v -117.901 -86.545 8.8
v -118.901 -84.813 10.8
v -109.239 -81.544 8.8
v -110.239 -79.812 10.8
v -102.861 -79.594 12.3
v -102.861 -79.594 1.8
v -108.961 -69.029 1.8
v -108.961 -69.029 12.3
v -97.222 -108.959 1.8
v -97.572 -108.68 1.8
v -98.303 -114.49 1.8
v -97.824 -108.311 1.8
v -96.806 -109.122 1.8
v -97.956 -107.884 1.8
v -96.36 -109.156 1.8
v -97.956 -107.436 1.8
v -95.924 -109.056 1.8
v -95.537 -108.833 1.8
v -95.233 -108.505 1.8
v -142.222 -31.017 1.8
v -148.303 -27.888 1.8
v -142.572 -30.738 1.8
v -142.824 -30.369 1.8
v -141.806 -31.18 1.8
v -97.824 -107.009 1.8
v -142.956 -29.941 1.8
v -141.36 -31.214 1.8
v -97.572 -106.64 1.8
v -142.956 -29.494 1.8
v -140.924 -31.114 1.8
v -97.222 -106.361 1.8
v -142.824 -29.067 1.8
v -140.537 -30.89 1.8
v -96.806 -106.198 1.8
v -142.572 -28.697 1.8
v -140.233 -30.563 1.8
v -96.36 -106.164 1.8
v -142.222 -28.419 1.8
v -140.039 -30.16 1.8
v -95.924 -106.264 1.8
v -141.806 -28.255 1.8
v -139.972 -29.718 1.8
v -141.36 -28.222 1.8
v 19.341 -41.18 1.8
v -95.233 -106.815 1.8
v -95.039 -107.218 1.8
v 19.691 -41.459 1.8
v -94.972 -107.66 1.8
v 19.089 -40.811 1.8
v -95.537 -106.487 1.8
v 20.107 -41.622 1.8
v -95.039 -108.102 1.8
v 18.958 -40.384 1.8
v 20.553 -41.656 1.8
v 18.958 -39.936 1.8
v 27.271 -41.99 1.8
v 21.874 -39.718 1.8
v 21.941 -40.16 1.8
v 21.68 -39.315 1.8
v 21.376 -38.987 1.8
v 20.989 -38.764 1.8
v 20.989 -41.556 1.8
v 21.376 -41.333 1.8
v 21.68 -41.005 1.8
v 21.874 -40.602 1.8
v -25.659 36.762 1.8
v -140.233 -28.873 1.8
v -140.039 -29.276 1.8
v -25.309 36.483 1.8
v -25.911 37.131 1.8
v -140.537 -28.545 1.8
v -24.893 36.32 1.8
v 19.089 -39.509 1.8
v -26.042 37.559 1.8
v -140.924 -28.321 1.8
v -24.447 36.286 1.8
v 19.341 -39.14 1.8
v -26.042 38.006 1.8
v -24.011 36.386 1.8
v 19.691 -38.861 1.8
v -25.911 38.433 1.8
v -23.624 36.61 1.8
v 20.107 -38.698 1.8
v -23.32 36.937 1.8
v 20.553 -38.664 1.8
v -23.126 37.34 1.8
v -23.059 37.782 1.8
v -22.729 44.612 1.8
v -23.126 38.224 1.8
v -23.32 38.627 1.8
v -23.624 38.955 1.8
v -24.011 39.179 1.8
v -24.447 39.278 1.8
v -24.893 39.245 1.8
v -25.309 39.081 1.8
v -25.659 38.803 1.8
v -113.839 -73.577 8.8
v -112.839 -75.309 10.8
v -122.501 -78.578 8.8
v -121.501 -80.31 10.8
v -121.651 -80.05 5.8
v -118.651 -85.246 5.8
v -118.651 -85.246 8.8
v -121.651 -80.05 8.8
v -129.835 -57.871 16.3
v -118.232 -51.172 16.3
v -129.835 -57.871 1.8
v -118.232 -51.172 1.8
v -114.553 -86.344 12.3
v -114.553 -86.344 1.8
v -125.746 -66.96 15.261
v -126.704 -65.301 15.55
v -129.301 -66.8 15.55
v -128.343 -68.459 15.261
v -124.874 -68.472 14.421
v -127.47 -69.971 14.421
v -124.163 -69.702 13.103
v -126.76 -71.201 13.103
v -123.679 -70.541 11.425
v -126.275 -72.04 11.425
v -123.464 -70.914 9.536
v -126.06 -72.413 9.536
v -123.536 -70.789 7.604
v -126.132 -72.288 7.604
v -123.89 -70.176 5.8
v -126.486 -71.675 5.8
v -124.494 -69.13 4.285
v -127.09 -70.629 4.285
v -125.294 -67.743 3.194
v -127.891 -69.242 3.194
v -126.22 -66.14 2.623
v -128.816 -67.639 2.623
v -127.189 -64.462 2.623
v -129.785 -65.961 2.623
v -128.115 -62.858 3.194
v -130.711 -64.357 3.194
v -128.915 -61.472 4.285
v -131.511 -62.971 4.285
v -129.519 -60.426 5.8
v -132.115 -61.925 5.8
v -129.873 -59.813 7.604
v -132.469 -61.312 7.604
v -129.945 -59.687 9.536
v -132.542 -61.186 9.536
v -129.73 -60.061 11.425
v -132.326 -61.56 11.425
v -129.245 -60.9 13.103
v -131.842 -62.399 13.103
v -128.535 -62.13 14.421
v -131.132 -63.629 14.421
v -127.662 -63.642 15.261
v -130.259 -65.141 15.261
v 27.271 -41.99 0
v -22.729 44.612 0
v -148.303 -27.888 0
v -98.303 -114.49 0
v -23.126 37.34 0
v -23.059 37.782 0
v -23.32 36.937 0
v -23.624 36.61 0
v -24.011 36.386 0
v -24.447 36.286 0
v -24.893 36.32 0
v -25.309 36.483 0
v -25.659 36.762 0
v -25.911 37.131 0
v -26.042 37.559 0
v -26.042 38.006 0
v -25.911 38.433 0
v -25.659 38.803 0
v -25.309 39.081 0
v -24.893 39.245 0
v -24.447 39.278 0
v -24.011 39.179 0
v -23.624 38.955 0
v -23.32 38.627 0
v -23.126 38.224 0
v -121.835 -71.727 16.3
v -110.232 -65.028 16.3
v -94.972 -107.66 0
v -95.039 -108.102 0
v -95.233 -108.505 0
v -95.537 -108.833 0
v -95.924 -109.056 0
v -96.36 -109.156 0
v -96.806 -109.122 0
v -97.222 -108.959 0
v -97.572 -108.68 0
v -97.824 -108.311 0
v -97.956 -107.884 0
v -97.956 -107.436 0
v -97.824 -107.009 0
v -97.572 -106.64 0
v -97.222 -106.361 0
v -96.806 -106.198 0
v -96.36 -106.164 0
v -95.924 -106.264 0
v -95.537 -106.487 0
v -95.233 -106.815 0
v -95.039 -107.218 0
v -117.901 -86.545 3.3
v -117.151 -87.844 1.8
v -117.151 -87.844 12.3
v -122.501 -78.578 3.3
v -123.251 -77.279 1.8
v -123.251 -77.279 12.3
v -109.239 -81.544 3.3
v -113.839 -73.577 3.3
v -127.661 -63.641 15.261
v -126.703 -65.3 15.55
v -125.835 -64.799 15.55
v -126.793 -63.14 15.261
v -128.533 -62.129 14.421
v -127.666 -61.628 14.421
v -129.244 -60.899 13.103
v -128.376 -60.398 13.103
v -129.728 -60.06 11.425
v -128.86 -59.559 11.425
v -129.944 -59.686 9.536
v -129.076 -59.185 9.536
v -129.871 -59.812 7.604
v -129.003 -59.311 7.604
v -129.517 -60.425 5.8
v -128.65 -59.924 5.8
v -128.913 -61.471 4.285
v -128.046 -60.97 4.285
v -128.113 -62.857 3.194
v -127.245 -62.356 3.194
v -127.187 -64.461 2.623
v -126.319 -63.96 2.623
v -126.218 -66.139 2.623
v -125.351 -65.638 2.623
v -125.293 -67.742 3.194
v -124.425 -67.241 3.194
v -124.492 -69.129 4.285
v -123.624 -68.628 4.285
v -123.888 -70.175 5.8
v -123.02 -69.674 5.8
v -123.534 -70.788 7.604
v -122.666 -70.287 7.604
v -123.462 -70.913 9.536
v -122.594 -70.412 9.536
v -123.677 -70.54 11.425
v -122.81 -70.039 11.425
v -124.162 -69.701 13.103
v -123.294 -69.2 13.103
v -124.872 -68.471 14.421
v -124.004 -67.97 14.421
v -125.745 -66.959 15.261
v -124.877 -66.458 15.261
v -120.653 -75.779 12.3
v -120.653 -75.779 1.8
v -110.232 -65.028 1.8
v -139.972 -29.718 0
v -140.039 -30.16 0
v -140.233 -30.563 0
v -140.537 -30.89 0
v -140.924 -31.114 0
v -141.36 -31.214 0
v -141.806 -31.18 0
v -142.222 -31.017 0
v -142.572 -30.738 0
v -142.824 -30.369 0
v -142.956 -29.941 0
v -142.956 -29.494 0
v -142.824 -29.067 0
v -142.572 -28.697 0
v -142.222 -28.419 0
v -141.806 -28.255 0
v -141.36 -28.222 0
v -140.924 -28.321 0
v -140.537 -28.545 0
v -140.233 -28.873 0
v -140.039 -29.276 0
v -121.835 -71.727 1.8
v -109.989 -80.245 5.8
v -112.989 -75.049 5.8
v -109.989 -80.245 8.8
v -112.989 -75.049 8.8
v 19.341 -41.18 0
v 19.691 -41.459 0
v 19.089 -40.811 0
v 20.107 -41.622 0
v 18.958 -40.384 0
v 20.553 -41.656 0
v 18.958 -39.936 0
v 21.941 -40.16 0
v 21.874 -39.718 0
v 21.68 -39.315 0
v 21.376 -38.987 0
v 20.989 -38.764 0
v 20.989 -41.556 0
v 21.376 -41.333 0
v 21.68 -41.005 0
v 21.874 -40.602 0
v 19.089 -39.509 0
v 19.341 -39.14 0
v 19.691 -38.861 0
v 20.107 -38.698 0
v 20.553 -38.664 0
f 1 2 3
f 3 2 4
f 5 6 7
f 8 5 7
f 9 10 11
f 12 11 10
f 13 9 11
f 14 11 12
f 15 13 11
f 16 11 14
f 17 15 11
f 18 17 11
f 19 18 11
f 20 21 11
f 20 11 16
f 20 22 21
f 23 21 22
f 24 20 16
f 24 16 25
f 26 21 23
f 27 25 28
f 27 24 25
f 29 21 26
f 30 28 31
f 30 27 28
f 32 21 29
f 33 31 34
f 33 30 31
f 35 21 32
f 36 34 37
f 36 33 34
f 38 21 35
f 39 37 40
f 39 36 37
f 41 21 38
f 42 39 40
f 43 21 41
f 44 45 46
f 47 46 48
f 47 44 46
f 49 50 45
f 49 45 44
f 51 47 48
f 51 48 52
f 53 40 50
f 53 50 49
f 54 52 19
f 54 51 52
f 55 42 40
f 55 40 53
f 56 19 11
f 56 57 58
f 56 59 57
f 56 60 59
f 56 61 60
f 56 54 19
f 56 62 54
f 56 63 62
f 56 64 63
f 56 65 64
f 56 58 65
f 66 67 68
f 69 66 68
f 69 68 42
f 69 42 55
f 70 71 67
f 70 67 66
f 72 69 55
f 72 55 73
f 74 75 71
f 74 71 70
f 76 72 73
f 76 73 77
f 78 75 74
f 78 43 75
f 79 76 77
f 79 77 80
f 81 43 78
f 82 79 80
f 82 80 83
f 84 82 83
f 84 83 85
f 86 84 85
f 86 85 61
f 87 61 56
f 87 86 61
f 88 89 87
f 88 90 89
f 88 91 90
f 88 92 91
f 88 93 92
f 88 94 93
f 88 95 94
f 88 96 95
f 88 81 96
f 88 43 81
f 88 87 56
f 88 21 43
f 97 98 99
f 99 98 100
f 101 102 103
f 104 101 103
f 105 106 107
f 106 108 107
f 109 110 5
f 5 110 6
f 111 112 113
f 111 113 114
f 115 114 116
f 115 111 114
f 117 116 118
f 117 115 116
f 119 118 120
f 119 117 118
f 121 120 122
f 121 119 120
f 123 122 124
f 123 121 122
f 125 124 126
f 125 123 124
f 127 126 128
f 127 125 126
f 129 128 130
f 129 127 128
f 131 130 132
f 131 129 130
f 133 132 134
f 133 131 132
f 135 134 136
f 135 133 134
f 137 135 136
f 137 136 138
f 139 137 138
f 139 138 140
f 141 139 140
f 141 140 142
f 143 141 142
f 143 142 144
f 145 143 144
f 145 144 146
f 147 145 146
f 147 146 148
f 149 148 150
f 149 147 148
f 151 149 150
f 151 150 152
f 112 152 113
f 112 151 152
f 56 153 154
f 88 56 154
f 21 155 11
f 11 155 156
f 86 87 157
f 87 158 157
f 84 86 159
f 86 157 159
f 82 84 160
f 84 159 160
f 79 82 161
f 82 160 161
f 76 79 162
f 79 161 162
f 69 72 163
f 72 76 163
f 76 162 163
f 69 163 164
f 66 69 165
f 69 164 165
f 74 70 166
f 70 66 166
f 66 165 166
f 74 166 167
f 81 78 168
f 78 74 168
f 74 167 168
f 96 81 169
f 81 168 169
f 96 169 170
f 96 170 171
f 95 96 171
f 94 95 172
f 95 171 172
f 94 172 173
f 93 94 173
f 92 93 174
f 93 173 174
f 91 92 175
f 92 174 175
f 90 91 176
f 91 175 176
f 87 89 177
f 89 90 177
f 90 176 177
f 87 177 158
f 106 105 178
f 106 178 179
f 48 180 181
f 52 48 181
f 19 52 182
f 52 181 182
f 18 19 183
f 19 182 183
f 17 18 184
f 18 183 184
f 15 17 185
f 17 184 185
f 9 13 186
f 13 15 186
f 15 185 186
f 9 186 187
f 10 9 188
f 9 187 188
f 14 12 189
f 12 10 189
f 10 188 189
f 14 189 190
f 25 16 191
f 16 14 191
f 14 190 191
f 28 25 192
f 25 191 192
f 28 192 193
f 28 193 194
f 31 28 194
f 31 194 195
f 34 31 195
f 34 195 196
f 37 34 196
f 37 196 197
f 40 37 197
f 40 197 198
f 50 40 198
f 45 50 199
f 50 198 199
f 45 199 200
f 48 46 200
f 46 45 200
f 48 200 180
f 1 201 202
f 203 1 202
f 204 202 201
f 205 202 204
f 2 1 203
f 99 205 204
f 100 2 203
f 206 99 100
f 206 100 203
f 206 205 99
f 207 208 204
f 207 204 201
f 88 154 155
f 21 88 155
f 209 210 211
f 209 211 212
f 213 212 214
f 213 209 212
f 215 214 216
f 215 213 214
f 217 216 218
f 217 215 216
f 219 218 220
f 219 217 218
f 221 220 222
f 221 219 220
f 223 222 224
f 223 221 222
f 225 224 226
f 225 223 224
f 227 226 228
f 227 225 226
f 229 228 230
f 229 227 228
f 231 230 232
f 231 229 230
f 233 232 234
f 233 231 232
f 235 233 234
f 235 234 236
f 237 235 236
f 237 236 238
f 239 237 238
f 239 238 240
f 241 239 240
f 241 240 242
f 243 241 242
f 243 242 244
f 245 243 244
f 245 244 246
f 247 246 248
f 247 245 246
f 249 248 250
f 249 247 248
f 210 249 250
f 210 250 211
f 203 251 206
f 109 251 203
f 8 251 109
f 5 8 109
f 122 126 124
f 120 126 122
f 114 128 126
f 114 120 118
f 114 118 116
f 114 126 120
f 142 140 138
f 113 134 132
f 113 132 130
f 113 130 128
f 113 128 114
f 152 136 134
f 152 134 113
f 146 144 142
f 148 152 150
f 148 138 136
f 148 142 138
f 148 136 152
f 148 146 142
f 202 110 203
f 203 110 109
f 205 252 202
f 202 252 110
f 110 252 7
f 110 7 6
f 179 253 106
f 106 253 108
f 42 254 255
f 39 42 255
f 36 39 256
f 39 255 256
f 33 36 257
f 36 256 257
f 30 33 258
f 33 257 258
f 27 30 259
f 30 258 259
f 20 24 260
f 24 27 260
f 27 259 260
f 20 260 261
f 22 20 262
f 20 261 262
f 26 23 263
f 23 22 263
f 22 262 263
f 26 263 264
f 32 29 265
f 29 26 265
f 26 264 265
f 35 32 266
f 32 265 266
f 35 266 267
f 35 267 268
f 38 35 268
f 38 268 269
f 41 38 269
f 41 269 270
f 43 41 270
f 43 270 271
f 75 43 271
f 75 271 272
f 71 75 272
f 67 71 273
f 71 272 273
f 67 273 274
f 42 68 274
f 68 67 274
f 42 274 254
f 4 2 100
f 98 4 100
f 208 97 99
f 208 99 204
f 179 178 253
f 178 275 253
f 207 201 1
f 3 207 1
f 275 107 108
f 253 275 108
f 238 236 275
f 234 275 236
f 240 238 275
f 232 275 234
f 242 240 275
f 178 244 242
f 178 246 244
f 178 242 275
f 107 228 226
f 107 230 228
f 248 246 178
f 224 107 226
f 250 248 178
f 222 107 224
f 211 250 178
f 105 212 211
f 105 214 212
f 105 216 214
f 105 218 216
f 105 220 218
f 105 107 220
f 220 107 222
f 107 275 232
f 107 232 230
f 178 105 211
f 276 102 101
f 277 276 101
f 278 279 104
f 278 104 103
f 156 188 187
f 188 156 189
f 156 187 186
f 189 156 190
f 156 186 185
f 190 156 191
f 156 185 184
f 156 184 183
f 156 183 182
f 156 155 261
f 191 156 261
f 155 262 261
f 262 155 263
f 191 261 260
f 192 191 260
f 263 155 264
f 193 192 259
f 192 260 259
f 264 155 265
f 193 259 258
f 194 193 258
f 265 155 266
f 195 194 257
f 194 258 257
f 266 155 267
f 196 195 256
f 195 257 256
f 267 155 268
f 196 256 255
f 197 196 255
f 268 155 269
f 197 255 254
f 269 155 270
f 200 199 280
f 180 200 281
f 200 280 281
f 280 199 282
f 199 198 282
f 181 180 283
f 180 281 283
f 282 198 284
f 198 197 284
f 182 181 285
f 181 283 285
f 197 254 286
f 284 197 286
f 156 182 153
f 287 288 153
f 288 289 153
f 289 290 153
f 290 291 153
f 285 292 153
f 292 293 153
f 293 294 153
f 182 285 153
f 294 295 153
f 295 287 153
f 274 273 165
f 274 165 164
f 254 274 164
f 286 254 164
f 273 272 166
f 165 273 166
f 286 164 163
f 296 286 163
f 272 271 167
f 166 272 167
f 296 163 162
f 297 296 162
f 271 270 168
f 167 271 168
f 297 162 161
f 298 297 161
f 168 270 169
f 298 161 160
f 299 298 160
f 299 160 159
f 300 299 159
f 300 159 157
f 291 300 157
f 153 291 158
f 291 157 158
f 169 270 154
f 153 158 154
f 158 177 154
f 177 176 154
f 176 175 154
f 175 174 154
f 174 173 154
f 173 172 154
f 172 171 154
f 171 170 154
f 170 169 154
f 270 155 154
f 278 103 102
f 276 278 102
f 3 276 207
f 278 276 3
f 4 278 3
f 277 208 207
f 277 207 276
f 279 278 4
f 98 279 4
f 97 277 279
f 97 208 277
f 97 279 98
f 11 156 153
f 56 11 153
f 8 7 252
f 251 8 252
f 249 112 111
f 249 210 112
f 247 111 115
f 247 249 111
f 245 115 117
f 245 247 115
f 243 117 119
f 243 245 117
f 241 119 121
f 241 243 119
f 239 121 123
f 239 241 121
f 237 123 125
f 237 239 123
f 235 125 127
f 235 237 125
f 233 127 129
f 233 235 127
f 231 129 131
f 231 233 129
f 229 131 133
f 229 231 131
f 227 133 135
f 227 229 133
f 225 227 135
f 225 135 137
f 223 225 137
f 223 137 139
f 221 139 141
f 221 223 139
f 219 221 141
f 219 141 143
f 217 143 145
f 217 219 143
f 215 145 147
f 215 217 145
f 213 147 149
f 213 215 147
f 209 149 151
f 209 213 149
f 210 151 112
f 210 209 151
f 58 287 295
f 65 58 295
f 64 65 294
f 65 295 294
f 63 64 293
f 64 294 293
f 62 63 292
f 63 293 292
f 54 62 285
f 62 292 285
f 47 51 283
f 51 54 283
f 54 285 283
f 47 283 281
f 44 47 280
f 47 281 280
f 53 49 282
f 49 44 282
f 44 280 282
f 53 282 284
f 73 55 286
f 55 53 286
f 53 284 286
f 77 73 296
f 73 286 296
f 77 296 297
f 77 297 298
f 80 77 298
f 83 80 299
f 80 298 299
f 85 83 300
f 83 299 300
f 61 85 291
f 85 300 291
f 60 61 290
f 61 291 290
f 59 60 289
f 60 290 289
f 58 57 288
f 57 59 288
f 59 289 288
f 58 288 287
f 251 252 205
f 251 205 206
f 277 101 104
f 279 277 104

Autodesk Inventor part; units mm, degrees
ref_plane "YZ Plane" through (0, 0, 0) normal (1, 0, 0) x (0, 1, 0)
ref_plane "XZ Plane" through (0, 0, 0) normal (0, 1, 0) x (-1, 0, 0)
ref_plane "XY Plane" through (0, 0, 0) normal (0, 0, 1) x (1, 0, 0)
ref_plane "Work Plane1" through (0, 0, 0) normal (0, 0, 1) x (1, 0, 0)
sketch "Sketch1" plane through (0, 0, 0) normal (0, 0, 1) x (1, 0, 0)
  line L0 (-106.8732, -139.6455) -> (-150.8241, -63.5202) projected
  line L1 (-148.3027, -27.8876) -> (-98.3027, -114.4901)
  line L2 (-98.3027, -114.4901) -> (27.271, -41.9901)
  line L3 (27.271, -41.9901) -> (-22.729, 44.6124)
  line L4 (-22.729, 44.6124) -> (-148.3027, -27.8876)
  line L5 (-174.3732, -22.7321) -> (-171.7751, -21.2321) projected
  line L6 (-123.3027, -71.1888) -> (2.271, 1.3112)
  circle A0 centre (-141.4725, -29.7177) radius 1.5
  circle A1 centre (-96.4725, -107.66) radius 1.5
  circle A2 centre (-24.5591, 37.7823) radius 1.5
  circle A3 centre (20.4409, -40.16) radius 1.5
  line L7 (-106.4027, -100.4605) -> (19.171, -27.9605)
  line L8 (-117.6027, -81.0615) -> (7.971, -8.5615)
  line L9 (-126.7027, -65.2999) -> (-1.129, 7.2001)
  dimension "d3" = 100
  dimension "d4" = 145
  dimension "d5" = 67.5
  dimension "d6" = 20
  dimension "d7" = 3
  dimension "d8" = 3
  dimension "d9" = 3
  dimension "d10" = 3
  dimension "d11" = 5
  dimension "d12" = 5
  dimension "d13" = 5
  dimension "d14" = 5
  dimension "d15" = 5
  dimension "d16" = 5
  dimension "d17" = 5
  dimension "d18" = 5
  dimension "d19" = 16.2
  dimension "d20" = 38.6
  dimension "d21" = 56.8
extrude "Extrusion1" add sketch "Sketch1" along normal blind 1.8
sketch "Sketch2" plane through (0, 0, 1.8) normal (0, 0, 1) x (1, 0, 0)
  line L0 (27.271, -41.9901) -> (-22.729, 44.6124) projected
  line L1 (-148.3027, -27.8876) -> (-98.3027, -114.4901) projected
  line L2 (-98.3027, -114.4901) -> (27.271, -41.9901) projected
  line L3 (-106.4027, -100.4605) -> (19.171, -27.9605)
  line L4 (-117.6027, -81.0615) -> (7.971, -8.5615)
  line L5 (-1.129, 7.2001) -> (-126.7027, -65.2999)
  line L6 (-130.7027, -58.3717) -> (-122.7027, -72.2281)
  line L7 (-122.7027, -72.2281) -> (-110.2319, -65.0281)
  line L8 (-110.2319, -65.0281) -> (-118.2319, -51.1717)
  line L9 (-118.2319, -51.1717) -> (-130.7027, -58.3717)
  line L10 (-120.6527, -75.7788) -> (-114.5527, -86.3443)
  line L11 (-114.5527, -86.3443) -> (-102.8613, -79.5943)
  line L12 (-102.8613, -79.5943) -> (-108.9613, -69.0288)
  line L13 (-108.9613, -69.0288) -> (-120.6527, -75.7788)
  line L14 (-111.0027, -92.4931) -> (-101.8027, -108.4279)
  line L15 (-101.8027, -108.4279) -> (-86.7338, -99.7279)
  line L16 (-86.7338, -99.7279) -> (-95.9338, -83.7931)
  line L17 (-95.9338, -83.7931) -> (-111.0027, -92.4931)
  line L18 (-251.5686, 33.0808) -> (-251.5686, 18.7808)
  line L19 (-253.5686, -22.5192) -> (-253.5686, -6.8192)
  line L20 (-249.5686, -8.2192) -> (-249.5686, -21.1192)
  line L21 (-462.5686, 42.1808) -> (-462.5686, -97.8192)
  line L22 (-412.5686, -27.8192) -> (-252.5686, -27.8192)
  line L23 (-269.9686, 33.0808) -> (-251.5686, 33.0808)
  line L24 (-252.5686, -26.8192) -> (-412.5686, -26.8192)
  line L25 (-249.5686, 36.4808) -> (-251.5686, 36.4808)
  line L26 (-251.5686, 15.3808) -> (-249.5686, 15.3808)
  line L27 (-252.5686, -27.8192) -> (-252.5686, -97.8192)
  line L28 (-462.5686, -97.8192) -> (-252.5686, -97.8192)
  line L29 (-252.5686, 32.3808) -> (-252.5686, 18.0808)
  line L30 (-249.5686, 15.3808) -> (-249.5686, 36.4808)
  line L31 (-266.9686, -6.8192) -> (-266.9686, -22.5192)
  line L32 (-253.5686, -21.1192) -> (-253.5686, -8.2192)
  line L33 (-249.5686, 9.6808) -> (-249.5686, -2.5192)
  line L34 (-252.5686, 42.1808) -> (-462.5686, 42.1808)
  line L35 (-246.5575, 29.6636) -> (-249.5686, 18.6388)
  line L36 (-252.5686, -8.2192) -> (-252.5686, -21.1192)
  circle A0 centre (-257.5686, 37.1808) radius 2.5
  line L37 (-251.5686, 18.7808) -> (-269.9686, 18.7808)
  line L38 (-251.5686, 36.4808) -> (-251.5686, 15.3808)
  line L39 (-266.9686, -22.5192) -> (-253.5686, -22.5192)
  line L40 (-249.5686, -21.1192) -> (-253.5686, -21.1192)
  circle A1 centre (-257.5686, 37.1808) radius 1.5
  line L41 (-252.5686, 42.1808) -> (-412.5686, 42.1808)
  line L42 (-249.5686, 33.0078) -> (-246.5575, 29.6636)
  line L43 (-252.5686, -27.8192) -> (-252.5686, 42.1808)
  circle A2 centre (-257.5686, 37.1808) radius 2.5
  line L44 (-269.9686, 18.7808) -> (-269.9686, 33.0808)
  line L45 (-266.0686, -2.5192) -> (-266.0686, 9.6808)
  line L46 (-412.5686, 42.1808) -> (-412.5686, -27.8192)
  line L47 (-252.5686, -21.1192) -> (-252.5686, -8.2192)
  line L48 (-266.0686, 9.6808) -> (-249.5686, 9.6808)
  line L49 (-253.5686, -6.8192) -> (-266.9686, -6.8192)
  line L50 (-249.5686, -2.5192) -> (-266.0686, -2.5192)
  line L51 (-253.5686, -8.2192) -> (-249.5686, -8.2192)
  line L52 (-249.5686, -8.2192) -> (-252.5686, -8.2192)
  line L53 (-252.5686, -21.1192) -> (-249.5686, -21.1192)
  line L54 (-249.5686, -21.1192) -> (-249.5686, -8.2192)
  line L55 (-252.5686, -2.5192) -> (-249.5686, -2.5192)
  line L56 (-249.5686, 9.6808) -> (-252.5686, 9.6808)
  line L57 (-249.5686, 18.6388) -> (-246.5575, 29.6636)
  line L58 (-249.5686, -2.5192) -> (-249.5686, 9.6808)
  line L59 (-246.5575, 29.6636) -> (-249.5686, 33.0078)
  line L60 (-246.5575, 29.6636) -> (-249.5686, 33.0078)
  line L61 (-249.5686, 33.0078) -> (-249.5686, 18.6388)
  line L62 (-249.5686, 18.6388) -> (-246.5575, 29.6636)
  line L63 (-249.5686, 33.0078) -> (-249.5686, 18.6388)
  line L64 (-252.5686, -21.1192) -> (-252.5686, -8.2192)
  line L65 (-249.5686, 36.4808) -> (-251.5686, 36.4808)
  line L66 (-462.5686, -97.8192) -> (-252.5686, -97.8192)
  line L67 (-251.5686, 15.3808) -> (-249.5686, 15.3808)
  line L68 (-251.5686, 18.7808) -> (-251.5686, 15.3808)
  line L69 (-252.5686, 18.7808) -> (-251.5686, 18.7808)
  line L70 (-251.5686, 33.0808) -> (-252.5686, 33.0808)
  line L71 (-251.5686, 36.4808) -> (-251.5686, 33.0808)
  line L72 (-249.5686, 15.3808) -> (-249.5686, 36.4808)
  line L73 (-462.5686, -97.8192) -> (-462.5686, 42.1808)
  line L74 (-462.5686, 42.1808) -> (-462.5686, -97.8192)
  line L75 (-252.5686, 18.7808) -> (-252.5686, -97.8192)
  line L76 (-252.5686, 42.1808) -> (-252.5686, 33.0808)
  line L77 (-252.5686, -97.8192) -> (-252.5686, 42.1808)
  line L78 (-252.5686, 9.6808) -> (-252.5686, -2.5192)
  line L79 (-252.5686, -97.8192) -> (-462.5686, -97.8192)
  line L80 (-462.5686, 42.1808) -> (-252.5686, 42.1808)
  line L81 (-252.5686, 42.1808) -> (-462.5686, 42.1808)
  line L82 (-252.5686, 18.7808) -> (-251.5686, 18.7808)
  line L83 (-249.5686, -2.5192) -> (-249.5686, 9.6808)
  line L84 (-249.5686, 9.6808) -> (-252.5686, 9.6808)
  line L85 (-252.5686, -2.5192) -> (-249.5686, -2.5192)
  line L86 (-251.5686, 36.4808) -> (-251.5686, 33.0808)
  line L87 (-251.5686, 33.0808) -> (-252.5686, 33.0808)
  line L88 (-252.5686, 18.7808) -> (-252.5686, 33.0808)
  line L89 (-251.5686, 18.7808) -> (-251.5686, 15.3808)
  line L90 (-251.5686, 15.3808) -> (-249.5686, 15.3808)
  line L91 (-249.5686, 15.3808) -> (-249.5686, 36.4808)
  line L92 (-249.5686, 36.4808) -> (-251.5686, 36.4808)
  line L93 (-252.5686, -2.5192) -> (-252.5686, 9.6808)
  point P0 (0, 0)
  dimension "d24" = 16.2
  dimension "d25" = 38.6
  dimension "d26" = 56.8
  dimension "d27" = 14.4
  dimension "d28" = 13.5
  dimension "d29" = 17.4
  dimension "d30" = 9.2
  dimension "d31" = 9.2
  dimension "d32" = 6.1
  dimension "d33" = 6.1
  dimension "d34" = 8
  dimension "d35" = 8
extrude "Extrusion2" add sketch "Sketch2" along normal blind 10.5 separate body contours L12 L11 L1 L4 | L4 L1 L13 L12 | L8 L7 L1 L5 | L5 L1 L9 L8
sketch "Sketch3" plane through (0, 0, 12.3) normal (0, 0, 1) x (1, 0, 0)
  line L0 (-122.7027, -72.2281) -> (-110.2319, -65.0281) projected
  line L1 (-110.2319, -65.0281) -> (-118.2319, -51.1717) projected
  line L2 (-118.2319, -51.1717) -> (-130.7027, -58.3717) projected
  line L3 (-130.7027, -58.3717) -> (-122.7027, -72.2281) projected
  point P0 (0, 0)
extrude "Extrusion3" add sketch "Sketch3" along normal blind 4 bodies 2
sketch "Sketch4" plane through (-122.7027, -72.2281, 1.8) normal (-0.866, -0.5, 0) x (0, 0, 1)
  circle A0 centre (7.25, 8) radius 6.5
  point P0 (-1.8, 1.2)
  dimension "d40" = 13
extrude "Extrusion4" add sketch "Sketch4" along normal blind 3 bodies 2
sketch "Sketch5" plane through (-114.5527, -86.3443, 1.8) normal (-0.866, -0.5, 0) x (0, 0, 1)
  line L0 (0, 12.2) -> (0, 0) projected
  line L1 (0, 0) -> (10.5, 0) projected
  line L2 (10.5, 12.2) -> (10.5, 0) projected
  line L3 (0, 12.2) -> (10.5, 12.2) projected
  point P0 (-1.8, 17.5)
extrude "Extrusion5" add sketch "Sketch5" along normal blind 3 bodies 2
sketch "Sketch6" plane through (-117.1507, -87.8443, 1.8) normal (-0.866, -0.5, 0) x (0, 0, 1)
  line L0 (0, 12.2) -> (0, 0) projected
  line L1 (0, 0) -> (10.5, 0) projected
  line L2 (10.5, 0) -> (10.5, 12.2) projected
  line L3 (10.5, 12.2) -> (0, 12.2) projected
  line L4 (1.5, 10.7) -> (1.5, 1.5)
  line L5 (1.5, 1.5) -> (9, 1.5)
  line L6 (9, 1.5) -> (9, 10.7)
  line L7 (9, 10.7) -> (1.5, 10.7)
  line L8 (4, 9) -> (7, 9)
  line L9 (7, 9) -> (7, 3)
  line L10 (7, 3) -> (4, 3)
  line L11 (4, 3) -> (4, 9)
  point P0 (-1.8, 17.5)
  dimension "d45" = 1.5
extrude "Extrusion6" cut sketch "Sketch6" against normal blind 10 contours L7 L6 L5 L4 bodies 2
chamfer "Chamfer1" distance 2 angle 45 2 edges at (-118.1698, -76.0773, 10.8) (-113.5698, -84.0447, 10.8)
sketch "Sketch11" plane through (-122.7027, -72.2281, 1.8) normal (-0.866, -0.5, 0) x (0, 0, 1)
  circle A0 centre (7.25, 8) radius 6.5 projected
  line L0 (0, 16) -> (0, 0) projected
  line L1 (0, 0) -> (14.5, 0) projected
  line L2 (14.5, 16) -> (14.5, 0) projected
  line L3 (0, 16) -> (14.5, 16) projected
  point P0 (-1.8, 1.2)
extrude "Extrusion11" cut sketch "Sketch11" against normal blind 1 bodies 2
properties material "Aluminum 6061"
